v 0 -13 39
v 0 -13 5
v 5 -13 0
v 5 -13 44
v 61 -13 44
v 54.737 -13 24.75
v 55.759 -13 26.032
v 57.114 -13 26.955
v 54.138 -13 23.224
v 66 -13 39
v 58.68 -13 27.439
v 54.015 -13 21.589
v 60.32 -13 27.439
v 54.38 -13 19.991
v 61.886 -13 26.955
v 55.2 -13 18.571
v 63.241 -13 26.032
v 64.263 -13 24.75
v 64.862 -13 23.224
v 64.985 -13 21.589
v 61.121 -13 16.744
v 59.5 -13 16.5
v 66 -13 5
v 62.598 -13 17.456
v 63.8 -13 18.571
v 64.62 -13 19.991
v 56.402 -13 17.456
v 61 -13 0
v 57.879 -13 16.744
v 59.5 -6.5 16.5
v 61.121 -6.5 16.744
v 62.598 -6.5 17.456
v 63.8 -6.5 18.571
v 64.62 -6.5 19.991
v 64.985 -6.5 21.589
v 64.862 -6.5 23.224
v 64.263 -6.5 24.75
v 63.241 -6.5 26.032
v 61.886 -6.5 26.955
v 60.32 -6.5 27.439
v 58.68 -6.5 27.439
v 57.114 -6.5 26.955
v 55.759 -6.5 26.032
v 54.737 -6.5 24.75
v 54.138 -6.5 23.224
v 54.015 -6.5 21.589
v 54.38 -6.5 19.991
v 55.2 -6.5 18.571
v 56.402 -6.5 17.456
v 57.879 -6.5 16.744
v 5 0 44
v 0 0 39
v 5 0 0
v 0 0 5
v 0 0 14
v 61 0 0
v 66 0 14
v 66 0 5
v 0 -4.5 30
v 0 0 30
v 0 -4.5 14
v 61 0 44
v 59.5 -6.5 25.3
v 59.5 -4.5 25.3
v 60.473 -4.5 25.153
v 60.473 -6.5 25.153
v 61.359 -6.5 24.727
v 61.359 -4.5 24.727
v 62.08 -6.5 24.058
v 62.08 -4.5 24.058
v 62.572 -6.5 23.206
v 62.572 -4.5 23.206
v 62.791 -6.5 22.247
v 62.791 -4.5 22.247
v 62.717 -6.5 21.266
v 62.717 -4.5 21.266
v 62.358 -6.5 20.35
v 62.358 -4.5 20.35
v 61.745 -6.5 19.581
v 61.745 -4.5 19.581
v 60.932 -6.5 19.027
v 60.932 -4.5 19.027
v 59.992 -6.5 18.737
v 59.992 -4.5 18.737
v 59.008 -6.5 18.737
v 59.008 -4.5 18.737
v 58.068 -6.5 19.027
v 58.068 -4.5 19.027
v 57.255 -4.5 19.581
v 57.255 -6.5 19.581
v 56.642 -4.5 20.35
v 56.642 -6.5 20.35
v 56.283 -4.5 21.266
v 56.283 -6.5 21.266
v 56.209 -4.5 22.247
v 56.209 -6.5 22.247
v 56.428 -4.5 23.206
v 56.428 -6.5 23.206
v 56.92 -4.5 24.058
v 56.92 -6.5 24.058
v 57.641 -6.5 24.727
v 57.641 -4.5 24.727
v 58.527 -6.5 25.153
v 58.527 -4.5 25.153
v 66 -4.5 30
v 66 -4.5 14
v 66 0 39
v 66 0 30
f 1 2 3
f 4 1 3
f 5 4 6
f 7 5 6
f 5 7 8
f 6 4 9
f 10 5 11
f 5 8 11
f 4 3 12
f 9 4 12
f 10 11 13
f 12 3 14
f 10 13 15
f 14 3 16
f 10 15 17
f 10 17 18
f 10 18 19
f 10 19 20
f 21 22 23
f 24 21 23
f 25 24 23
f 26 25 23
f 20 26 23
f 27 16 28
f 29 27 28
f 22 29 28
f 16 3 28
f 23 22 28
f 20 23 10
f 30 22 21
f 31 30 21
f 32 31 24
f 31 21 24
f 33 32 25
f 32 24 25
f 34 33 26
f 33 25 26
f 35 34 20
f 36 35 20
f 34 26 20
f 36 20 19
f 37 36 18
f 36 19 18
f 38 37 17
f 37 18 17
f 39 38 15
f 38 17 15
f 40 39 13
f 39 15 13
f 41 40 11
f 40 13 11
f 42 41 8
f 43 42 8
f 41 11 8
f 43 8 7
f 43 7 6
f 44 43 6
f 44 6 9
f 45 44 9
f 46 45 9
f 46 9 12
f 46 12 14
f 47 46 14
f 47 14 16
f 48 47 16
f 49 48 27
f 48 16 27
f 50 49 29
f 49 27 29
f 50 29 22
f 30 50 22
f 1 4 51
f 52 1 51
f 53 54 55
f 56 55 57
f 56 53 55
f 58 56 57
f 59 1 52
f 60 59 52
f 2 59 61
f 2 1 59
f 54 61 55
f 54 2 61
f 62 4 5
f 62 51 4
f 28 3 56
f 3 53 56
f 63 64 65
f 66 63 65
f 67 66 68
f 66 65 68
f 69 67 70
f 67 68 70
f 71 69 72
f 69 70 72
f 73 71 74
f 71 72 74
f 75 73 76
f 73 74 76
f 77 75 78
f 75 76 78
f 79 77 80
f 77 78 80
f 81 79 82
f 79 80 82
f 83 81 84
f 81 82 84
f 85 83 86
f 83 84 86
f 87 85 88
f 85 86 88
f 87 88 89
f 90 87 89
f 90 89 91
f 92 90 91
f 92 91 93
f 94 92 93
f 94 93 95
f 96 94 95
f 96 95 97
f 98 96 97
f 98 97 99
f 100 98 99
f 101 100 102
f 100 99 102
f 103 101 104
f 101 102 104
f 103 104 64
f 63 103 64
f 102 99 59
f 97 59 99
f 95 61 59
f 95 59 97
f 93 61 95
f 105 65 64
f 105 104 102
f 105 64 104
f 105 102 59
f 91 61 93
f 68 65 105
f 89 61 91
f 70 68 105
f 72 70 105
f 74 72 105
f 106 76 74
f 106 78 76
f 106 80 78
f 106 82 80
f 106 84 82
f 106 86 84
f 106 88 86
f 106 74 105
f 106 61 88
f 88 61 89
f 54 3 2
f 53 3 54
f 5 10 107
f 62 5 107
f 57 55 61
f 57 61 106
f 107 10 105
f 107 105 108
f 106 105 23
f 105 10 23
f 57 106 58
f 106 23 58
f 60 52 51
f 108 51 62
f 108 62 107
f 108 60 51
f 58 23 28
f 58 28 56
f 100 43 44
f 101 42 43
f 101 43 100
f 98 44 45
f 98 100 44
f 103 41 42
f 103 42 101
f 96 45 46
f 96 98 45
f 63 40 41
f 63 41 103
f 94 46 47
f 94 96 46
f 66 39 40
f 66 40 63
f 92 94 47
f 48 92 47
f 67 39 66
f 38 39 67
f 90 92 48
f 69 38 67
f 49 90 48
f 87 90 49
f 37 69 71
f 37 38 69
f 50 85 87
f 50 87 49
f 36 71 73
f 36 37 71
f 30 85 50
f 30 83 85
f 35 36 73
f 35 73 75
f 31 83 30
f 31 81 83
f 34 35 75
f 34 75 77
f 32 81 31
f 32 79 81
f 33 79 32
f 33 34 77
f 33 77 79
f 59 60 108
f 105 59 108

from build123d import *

# Parameters (mm, degrees)
ESBO_O1_W                = 66
ESBO_O1_H                = 13
RESSALTO_EXTRUS_O1_DEPTH = 44
ESBO_O2_W                = 66
ESBO_O2_H                = 16
CORTE_EXTRUS_O1_DEPTH    = 4.5
CHANFRO1_SIZE            = 5
ESBO_O4_R                = 3.3
CORTE_EXTRUS_O2_DEPTH    = 2
ESBO_O5_R                = 5.5
CORTE_EXTRUS_O3_DEPTH    = 6.5


with BuildPart() as part:
    # Esboço1 → Ressalto-extrusão1 (new body)
    with BuildSketch(Plane.XY):
        with Locations((33, -6.5)):
            Rectangle(ESBO_O1_W, ESBO_O1_H)
    extrude(amount=RESSALTO_EXTRUS_O1_DEPTH)

    # Esboço2 → Corte-extrusão1 (cut)
    with BuildSketch(Plane(origin=(0, 0, 0), x_dir=(1, 0, 0), z_dir=(0, 1, 0))):
        with Locations((33, -22)):
            Rectangle(ESBO_O2_W, ESBO_O2_H)
    extrude(amount=-CORTE_EXTRUS_O1_DEPTH, mode=Mode.SUBTRACT)

    # Chanfro1
    chanfro1_edges = [part.edges().sort_by_distance(p)[0] for p in [
        (66, -6.5, 44),
        (0, -6.5, 44),
        (66, -6.5, 0),
        (0, -6.5, 0),
    ]]
    chamfer(chanfro1_edges, length=CHANFRO1_SIZE)

    # Esboço4 → Corte-extrusão2 (cut)
    with BuildSketch(Plane(origin=(0, -4.5, 0), x_dir=(1, 0, 0), z_dir=(0, 1, 0))):
        with Locations(Location((59.5, -22, 0), (0, 0, 270))):
            Circle(ESBO_O4_R)
    extrude(amount=-CORTE_EXTRUS_O2_DEPTH, mode=Mode.SUBTRACT)

    # Esboço5 → Corte-extrusão3 (cut)
    with BuildSketch(Plane.XZ.offset(13)):
        with Locations(Location((59.5, 22, 0), (0, 0, 270))):
            Circle(ESBO_O5_R)
    extrude(amount=-CORTE_EXTRUS_O3_DEPTH, mode=Mode.SUBTRACT)


solid = part.part
